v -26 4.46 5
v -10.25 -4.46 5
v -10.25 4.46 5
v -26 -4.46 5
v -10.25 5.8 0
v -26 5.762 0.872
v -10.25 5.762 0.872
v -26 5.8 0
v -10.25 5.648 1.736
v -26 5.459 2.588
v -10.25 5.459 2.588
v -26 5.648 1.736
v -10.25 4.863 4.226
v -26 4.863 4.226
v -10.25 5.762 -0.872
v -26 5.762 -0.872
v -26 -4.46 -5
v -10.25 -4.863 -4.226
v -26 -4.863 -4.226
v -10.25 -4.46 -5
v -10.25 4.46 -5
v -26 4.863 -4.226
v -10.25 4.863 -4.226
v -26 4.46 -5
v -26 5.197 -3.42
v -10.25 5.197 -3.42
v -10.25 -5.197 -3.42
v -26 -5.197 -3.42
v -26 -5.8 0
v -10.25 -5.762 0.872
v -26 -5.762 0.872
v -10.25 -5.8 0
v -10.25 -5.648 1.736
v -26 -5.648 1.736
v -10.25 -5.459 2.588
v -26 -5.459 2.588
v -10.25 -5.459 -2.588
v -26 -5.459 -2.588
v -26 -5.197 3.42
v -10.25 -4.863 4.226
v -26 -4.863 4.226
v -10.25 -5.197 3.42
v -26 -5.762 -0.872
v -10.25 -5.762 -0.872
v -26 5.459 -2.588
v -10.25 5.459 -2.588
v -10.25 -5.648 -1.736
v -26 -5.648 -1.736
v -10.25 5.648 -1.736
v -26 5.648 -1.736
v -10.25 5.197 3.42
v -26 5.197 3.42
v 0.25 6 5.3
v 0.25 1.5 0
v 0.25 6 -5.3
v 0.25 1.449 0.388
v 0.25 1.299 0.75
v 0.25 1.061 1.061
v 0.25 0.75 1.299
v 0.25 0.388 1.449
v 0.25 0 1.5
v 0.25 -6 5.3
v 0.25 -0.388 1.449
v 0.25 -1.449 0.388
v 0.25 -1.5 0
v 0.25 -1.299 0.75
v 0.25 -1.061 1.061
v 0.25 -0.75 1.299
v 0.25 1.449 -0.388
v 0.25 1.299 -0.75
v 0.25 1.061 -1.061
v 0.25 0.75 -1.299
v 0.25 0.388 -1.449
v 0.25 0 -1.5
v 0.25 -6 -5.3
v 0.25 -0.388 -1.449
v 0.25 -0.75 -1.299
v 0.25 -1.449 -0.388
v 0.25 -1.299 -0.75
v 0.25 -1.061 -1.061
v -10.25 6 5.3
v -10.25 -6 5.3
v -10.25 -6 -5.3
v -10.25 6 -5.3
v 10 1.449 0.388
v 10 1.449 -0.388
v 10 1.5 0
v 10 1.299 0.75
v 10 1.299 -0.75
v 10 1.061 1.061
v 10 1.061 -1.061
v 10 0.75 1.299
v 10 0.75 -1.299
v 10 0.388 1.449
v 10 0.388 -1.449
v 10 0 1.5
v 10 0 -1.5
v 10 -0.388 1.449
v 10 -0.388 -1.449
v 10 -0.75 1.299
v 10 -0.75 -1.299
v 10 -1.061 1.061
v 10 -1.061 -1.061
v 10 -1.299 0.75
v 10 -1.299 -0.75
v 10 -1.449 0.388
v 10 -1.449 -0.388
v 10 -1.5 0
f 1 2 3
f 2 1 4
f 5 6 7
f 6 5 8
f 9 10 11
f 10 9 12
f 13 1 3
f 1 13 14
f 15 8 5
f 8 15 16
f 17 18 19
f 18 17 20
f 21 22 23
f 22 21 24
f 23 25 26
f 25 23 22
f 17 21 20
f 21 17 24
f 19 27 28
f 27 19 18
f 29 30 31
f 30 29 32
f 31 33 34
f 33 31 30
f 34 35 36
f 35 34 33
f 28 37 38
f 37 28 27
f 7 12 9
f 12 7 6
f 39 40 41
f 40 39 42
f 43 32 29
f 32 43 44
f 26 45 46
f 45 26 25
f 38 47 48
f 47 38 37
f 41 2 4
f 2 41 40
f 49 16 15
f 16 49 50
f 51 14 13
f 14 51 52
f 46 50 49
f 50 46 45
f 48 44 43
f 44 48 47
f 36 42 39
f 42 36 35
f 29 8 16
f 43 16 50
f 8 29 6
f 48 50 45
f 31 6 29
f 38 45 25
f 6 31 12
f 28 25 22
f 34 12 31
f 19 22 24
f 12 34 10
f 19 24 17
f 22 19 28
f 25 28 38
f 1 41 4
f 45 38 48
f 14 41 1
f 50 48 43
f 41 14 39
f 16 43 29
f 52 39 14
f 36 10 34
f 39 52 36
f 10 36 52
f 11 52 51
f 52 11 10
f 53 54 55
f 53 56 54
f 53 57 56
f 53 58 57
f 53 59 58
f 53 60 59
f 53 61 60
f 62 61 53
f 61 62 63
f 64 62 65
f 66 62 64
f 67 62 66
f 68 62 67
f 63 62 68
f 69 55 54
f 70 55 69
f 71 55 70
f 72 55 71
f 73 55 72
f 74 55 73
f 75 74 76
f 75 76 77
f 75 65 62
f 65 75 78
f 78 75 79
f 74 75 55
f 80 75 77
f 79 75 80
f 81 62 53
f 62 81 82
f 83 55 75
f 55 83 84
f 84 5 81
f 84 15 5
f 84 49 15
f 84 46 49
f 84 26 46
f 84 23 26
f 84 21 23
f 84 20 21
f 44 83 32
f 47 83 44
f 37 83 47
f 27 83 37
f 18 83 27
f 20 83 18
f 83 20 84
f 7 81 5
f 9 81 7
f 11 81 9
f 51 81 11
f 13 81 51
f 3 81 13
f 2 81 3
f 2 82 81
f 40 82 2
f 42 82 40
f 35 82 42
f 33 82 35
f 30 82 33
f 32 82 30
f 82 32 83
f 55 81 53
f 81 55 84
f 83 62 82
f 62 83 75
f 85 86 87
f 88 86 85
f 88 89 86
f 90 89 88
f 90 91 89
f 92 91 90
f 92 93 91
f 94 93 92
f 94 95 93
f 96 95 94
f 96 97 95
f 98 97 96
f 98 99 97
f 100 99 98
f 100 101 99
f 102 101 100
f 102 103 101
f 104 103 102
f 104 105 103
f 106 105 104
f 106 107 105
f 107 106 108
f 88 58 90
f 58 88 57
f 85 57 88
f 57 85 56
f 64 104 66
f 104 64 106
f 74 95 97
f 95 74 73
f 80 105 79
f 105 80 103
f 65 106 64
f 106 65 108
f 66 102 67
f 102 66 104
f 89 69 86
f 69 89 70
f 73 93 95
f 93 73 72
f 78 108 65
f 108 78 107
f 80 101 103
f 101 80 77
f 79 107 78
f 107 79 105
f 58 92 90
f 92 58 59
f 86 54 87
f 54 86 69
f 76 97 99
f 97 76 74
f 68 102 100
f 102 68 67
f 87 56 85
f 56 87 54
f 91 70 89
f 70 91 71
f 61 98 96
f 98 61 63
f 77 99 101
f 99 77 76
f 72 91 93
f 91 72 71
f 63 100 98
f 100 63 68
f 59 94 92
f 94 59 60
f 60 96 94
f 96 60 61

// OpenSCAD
/*
 * N20 gear motor
 */

$fs = 0.4; // millimetres; smallest segment

motor_w = 16; // Width of motor (x axis)
motor_h = 10; // motor height
motor_d = 12; // y
gearbox_h = 10.6;
gearbox_d = 12;
gearbox_w = 10;
 
module n20_motor(margin=0.2)
{
    motor_d_half = motor_d / 2;
    motor_w_half = motor_w / 2;
    gearbox_w_half = gearbox_w / 2;
    // Oval motor body
    curve_rad = 10;
    translate([-motor_w_half - gearbox_w,0,0])
    rotate([0,90,0]) {
        $fa = 5.0; // more polygons?
        linear_extrude(motor_w, center=true) {
            intersection() {
            
                translate([0, motor_d_half - curve_rad - margin])
                    circle(r=curve_rad);
                translate([0, -motor_d_half + curve_rad + margin])
                    circle(r=curve_rad);
                square([motor_h,motor_d + (margin*2)], center=true);
            }
        }
    }
    // Cube gearbox
    translate([- gearbox_w_half, 0,0]) {
        cube([ gearbox_w + 0.1 + (margin*2), gearbox_d, gearbox_h], center=true); 
    }
    // Shaft
    translate([0,0,0]) {
        rotate([0,90,0]) {
            cylinder(h=10, r=1.5);
        }
    }
}

module n20_motor_top_ext(back_part=6.0) {
    // Motor with a box on top
    // And a cylinder out the back.
    n20_motor();
    translate([-motor_w-gearbox_w, -(motor_d/2), motor_h/2 - 0.2])
        cube([motor_w+gearbox_w, gearbox_d, gearbox_h]);
        
    // This is a cutout for wiring, terminals etc
    back_x = -motor_w-gearbox_w - back_part;
    translate([back_x, -(motor_d/2) + 1, -motor_h/2 + 2]) {
        cube([back_part + 0.2, motor_d - 2, motor_h + 0.2]);
    }
}

n20_motor();
